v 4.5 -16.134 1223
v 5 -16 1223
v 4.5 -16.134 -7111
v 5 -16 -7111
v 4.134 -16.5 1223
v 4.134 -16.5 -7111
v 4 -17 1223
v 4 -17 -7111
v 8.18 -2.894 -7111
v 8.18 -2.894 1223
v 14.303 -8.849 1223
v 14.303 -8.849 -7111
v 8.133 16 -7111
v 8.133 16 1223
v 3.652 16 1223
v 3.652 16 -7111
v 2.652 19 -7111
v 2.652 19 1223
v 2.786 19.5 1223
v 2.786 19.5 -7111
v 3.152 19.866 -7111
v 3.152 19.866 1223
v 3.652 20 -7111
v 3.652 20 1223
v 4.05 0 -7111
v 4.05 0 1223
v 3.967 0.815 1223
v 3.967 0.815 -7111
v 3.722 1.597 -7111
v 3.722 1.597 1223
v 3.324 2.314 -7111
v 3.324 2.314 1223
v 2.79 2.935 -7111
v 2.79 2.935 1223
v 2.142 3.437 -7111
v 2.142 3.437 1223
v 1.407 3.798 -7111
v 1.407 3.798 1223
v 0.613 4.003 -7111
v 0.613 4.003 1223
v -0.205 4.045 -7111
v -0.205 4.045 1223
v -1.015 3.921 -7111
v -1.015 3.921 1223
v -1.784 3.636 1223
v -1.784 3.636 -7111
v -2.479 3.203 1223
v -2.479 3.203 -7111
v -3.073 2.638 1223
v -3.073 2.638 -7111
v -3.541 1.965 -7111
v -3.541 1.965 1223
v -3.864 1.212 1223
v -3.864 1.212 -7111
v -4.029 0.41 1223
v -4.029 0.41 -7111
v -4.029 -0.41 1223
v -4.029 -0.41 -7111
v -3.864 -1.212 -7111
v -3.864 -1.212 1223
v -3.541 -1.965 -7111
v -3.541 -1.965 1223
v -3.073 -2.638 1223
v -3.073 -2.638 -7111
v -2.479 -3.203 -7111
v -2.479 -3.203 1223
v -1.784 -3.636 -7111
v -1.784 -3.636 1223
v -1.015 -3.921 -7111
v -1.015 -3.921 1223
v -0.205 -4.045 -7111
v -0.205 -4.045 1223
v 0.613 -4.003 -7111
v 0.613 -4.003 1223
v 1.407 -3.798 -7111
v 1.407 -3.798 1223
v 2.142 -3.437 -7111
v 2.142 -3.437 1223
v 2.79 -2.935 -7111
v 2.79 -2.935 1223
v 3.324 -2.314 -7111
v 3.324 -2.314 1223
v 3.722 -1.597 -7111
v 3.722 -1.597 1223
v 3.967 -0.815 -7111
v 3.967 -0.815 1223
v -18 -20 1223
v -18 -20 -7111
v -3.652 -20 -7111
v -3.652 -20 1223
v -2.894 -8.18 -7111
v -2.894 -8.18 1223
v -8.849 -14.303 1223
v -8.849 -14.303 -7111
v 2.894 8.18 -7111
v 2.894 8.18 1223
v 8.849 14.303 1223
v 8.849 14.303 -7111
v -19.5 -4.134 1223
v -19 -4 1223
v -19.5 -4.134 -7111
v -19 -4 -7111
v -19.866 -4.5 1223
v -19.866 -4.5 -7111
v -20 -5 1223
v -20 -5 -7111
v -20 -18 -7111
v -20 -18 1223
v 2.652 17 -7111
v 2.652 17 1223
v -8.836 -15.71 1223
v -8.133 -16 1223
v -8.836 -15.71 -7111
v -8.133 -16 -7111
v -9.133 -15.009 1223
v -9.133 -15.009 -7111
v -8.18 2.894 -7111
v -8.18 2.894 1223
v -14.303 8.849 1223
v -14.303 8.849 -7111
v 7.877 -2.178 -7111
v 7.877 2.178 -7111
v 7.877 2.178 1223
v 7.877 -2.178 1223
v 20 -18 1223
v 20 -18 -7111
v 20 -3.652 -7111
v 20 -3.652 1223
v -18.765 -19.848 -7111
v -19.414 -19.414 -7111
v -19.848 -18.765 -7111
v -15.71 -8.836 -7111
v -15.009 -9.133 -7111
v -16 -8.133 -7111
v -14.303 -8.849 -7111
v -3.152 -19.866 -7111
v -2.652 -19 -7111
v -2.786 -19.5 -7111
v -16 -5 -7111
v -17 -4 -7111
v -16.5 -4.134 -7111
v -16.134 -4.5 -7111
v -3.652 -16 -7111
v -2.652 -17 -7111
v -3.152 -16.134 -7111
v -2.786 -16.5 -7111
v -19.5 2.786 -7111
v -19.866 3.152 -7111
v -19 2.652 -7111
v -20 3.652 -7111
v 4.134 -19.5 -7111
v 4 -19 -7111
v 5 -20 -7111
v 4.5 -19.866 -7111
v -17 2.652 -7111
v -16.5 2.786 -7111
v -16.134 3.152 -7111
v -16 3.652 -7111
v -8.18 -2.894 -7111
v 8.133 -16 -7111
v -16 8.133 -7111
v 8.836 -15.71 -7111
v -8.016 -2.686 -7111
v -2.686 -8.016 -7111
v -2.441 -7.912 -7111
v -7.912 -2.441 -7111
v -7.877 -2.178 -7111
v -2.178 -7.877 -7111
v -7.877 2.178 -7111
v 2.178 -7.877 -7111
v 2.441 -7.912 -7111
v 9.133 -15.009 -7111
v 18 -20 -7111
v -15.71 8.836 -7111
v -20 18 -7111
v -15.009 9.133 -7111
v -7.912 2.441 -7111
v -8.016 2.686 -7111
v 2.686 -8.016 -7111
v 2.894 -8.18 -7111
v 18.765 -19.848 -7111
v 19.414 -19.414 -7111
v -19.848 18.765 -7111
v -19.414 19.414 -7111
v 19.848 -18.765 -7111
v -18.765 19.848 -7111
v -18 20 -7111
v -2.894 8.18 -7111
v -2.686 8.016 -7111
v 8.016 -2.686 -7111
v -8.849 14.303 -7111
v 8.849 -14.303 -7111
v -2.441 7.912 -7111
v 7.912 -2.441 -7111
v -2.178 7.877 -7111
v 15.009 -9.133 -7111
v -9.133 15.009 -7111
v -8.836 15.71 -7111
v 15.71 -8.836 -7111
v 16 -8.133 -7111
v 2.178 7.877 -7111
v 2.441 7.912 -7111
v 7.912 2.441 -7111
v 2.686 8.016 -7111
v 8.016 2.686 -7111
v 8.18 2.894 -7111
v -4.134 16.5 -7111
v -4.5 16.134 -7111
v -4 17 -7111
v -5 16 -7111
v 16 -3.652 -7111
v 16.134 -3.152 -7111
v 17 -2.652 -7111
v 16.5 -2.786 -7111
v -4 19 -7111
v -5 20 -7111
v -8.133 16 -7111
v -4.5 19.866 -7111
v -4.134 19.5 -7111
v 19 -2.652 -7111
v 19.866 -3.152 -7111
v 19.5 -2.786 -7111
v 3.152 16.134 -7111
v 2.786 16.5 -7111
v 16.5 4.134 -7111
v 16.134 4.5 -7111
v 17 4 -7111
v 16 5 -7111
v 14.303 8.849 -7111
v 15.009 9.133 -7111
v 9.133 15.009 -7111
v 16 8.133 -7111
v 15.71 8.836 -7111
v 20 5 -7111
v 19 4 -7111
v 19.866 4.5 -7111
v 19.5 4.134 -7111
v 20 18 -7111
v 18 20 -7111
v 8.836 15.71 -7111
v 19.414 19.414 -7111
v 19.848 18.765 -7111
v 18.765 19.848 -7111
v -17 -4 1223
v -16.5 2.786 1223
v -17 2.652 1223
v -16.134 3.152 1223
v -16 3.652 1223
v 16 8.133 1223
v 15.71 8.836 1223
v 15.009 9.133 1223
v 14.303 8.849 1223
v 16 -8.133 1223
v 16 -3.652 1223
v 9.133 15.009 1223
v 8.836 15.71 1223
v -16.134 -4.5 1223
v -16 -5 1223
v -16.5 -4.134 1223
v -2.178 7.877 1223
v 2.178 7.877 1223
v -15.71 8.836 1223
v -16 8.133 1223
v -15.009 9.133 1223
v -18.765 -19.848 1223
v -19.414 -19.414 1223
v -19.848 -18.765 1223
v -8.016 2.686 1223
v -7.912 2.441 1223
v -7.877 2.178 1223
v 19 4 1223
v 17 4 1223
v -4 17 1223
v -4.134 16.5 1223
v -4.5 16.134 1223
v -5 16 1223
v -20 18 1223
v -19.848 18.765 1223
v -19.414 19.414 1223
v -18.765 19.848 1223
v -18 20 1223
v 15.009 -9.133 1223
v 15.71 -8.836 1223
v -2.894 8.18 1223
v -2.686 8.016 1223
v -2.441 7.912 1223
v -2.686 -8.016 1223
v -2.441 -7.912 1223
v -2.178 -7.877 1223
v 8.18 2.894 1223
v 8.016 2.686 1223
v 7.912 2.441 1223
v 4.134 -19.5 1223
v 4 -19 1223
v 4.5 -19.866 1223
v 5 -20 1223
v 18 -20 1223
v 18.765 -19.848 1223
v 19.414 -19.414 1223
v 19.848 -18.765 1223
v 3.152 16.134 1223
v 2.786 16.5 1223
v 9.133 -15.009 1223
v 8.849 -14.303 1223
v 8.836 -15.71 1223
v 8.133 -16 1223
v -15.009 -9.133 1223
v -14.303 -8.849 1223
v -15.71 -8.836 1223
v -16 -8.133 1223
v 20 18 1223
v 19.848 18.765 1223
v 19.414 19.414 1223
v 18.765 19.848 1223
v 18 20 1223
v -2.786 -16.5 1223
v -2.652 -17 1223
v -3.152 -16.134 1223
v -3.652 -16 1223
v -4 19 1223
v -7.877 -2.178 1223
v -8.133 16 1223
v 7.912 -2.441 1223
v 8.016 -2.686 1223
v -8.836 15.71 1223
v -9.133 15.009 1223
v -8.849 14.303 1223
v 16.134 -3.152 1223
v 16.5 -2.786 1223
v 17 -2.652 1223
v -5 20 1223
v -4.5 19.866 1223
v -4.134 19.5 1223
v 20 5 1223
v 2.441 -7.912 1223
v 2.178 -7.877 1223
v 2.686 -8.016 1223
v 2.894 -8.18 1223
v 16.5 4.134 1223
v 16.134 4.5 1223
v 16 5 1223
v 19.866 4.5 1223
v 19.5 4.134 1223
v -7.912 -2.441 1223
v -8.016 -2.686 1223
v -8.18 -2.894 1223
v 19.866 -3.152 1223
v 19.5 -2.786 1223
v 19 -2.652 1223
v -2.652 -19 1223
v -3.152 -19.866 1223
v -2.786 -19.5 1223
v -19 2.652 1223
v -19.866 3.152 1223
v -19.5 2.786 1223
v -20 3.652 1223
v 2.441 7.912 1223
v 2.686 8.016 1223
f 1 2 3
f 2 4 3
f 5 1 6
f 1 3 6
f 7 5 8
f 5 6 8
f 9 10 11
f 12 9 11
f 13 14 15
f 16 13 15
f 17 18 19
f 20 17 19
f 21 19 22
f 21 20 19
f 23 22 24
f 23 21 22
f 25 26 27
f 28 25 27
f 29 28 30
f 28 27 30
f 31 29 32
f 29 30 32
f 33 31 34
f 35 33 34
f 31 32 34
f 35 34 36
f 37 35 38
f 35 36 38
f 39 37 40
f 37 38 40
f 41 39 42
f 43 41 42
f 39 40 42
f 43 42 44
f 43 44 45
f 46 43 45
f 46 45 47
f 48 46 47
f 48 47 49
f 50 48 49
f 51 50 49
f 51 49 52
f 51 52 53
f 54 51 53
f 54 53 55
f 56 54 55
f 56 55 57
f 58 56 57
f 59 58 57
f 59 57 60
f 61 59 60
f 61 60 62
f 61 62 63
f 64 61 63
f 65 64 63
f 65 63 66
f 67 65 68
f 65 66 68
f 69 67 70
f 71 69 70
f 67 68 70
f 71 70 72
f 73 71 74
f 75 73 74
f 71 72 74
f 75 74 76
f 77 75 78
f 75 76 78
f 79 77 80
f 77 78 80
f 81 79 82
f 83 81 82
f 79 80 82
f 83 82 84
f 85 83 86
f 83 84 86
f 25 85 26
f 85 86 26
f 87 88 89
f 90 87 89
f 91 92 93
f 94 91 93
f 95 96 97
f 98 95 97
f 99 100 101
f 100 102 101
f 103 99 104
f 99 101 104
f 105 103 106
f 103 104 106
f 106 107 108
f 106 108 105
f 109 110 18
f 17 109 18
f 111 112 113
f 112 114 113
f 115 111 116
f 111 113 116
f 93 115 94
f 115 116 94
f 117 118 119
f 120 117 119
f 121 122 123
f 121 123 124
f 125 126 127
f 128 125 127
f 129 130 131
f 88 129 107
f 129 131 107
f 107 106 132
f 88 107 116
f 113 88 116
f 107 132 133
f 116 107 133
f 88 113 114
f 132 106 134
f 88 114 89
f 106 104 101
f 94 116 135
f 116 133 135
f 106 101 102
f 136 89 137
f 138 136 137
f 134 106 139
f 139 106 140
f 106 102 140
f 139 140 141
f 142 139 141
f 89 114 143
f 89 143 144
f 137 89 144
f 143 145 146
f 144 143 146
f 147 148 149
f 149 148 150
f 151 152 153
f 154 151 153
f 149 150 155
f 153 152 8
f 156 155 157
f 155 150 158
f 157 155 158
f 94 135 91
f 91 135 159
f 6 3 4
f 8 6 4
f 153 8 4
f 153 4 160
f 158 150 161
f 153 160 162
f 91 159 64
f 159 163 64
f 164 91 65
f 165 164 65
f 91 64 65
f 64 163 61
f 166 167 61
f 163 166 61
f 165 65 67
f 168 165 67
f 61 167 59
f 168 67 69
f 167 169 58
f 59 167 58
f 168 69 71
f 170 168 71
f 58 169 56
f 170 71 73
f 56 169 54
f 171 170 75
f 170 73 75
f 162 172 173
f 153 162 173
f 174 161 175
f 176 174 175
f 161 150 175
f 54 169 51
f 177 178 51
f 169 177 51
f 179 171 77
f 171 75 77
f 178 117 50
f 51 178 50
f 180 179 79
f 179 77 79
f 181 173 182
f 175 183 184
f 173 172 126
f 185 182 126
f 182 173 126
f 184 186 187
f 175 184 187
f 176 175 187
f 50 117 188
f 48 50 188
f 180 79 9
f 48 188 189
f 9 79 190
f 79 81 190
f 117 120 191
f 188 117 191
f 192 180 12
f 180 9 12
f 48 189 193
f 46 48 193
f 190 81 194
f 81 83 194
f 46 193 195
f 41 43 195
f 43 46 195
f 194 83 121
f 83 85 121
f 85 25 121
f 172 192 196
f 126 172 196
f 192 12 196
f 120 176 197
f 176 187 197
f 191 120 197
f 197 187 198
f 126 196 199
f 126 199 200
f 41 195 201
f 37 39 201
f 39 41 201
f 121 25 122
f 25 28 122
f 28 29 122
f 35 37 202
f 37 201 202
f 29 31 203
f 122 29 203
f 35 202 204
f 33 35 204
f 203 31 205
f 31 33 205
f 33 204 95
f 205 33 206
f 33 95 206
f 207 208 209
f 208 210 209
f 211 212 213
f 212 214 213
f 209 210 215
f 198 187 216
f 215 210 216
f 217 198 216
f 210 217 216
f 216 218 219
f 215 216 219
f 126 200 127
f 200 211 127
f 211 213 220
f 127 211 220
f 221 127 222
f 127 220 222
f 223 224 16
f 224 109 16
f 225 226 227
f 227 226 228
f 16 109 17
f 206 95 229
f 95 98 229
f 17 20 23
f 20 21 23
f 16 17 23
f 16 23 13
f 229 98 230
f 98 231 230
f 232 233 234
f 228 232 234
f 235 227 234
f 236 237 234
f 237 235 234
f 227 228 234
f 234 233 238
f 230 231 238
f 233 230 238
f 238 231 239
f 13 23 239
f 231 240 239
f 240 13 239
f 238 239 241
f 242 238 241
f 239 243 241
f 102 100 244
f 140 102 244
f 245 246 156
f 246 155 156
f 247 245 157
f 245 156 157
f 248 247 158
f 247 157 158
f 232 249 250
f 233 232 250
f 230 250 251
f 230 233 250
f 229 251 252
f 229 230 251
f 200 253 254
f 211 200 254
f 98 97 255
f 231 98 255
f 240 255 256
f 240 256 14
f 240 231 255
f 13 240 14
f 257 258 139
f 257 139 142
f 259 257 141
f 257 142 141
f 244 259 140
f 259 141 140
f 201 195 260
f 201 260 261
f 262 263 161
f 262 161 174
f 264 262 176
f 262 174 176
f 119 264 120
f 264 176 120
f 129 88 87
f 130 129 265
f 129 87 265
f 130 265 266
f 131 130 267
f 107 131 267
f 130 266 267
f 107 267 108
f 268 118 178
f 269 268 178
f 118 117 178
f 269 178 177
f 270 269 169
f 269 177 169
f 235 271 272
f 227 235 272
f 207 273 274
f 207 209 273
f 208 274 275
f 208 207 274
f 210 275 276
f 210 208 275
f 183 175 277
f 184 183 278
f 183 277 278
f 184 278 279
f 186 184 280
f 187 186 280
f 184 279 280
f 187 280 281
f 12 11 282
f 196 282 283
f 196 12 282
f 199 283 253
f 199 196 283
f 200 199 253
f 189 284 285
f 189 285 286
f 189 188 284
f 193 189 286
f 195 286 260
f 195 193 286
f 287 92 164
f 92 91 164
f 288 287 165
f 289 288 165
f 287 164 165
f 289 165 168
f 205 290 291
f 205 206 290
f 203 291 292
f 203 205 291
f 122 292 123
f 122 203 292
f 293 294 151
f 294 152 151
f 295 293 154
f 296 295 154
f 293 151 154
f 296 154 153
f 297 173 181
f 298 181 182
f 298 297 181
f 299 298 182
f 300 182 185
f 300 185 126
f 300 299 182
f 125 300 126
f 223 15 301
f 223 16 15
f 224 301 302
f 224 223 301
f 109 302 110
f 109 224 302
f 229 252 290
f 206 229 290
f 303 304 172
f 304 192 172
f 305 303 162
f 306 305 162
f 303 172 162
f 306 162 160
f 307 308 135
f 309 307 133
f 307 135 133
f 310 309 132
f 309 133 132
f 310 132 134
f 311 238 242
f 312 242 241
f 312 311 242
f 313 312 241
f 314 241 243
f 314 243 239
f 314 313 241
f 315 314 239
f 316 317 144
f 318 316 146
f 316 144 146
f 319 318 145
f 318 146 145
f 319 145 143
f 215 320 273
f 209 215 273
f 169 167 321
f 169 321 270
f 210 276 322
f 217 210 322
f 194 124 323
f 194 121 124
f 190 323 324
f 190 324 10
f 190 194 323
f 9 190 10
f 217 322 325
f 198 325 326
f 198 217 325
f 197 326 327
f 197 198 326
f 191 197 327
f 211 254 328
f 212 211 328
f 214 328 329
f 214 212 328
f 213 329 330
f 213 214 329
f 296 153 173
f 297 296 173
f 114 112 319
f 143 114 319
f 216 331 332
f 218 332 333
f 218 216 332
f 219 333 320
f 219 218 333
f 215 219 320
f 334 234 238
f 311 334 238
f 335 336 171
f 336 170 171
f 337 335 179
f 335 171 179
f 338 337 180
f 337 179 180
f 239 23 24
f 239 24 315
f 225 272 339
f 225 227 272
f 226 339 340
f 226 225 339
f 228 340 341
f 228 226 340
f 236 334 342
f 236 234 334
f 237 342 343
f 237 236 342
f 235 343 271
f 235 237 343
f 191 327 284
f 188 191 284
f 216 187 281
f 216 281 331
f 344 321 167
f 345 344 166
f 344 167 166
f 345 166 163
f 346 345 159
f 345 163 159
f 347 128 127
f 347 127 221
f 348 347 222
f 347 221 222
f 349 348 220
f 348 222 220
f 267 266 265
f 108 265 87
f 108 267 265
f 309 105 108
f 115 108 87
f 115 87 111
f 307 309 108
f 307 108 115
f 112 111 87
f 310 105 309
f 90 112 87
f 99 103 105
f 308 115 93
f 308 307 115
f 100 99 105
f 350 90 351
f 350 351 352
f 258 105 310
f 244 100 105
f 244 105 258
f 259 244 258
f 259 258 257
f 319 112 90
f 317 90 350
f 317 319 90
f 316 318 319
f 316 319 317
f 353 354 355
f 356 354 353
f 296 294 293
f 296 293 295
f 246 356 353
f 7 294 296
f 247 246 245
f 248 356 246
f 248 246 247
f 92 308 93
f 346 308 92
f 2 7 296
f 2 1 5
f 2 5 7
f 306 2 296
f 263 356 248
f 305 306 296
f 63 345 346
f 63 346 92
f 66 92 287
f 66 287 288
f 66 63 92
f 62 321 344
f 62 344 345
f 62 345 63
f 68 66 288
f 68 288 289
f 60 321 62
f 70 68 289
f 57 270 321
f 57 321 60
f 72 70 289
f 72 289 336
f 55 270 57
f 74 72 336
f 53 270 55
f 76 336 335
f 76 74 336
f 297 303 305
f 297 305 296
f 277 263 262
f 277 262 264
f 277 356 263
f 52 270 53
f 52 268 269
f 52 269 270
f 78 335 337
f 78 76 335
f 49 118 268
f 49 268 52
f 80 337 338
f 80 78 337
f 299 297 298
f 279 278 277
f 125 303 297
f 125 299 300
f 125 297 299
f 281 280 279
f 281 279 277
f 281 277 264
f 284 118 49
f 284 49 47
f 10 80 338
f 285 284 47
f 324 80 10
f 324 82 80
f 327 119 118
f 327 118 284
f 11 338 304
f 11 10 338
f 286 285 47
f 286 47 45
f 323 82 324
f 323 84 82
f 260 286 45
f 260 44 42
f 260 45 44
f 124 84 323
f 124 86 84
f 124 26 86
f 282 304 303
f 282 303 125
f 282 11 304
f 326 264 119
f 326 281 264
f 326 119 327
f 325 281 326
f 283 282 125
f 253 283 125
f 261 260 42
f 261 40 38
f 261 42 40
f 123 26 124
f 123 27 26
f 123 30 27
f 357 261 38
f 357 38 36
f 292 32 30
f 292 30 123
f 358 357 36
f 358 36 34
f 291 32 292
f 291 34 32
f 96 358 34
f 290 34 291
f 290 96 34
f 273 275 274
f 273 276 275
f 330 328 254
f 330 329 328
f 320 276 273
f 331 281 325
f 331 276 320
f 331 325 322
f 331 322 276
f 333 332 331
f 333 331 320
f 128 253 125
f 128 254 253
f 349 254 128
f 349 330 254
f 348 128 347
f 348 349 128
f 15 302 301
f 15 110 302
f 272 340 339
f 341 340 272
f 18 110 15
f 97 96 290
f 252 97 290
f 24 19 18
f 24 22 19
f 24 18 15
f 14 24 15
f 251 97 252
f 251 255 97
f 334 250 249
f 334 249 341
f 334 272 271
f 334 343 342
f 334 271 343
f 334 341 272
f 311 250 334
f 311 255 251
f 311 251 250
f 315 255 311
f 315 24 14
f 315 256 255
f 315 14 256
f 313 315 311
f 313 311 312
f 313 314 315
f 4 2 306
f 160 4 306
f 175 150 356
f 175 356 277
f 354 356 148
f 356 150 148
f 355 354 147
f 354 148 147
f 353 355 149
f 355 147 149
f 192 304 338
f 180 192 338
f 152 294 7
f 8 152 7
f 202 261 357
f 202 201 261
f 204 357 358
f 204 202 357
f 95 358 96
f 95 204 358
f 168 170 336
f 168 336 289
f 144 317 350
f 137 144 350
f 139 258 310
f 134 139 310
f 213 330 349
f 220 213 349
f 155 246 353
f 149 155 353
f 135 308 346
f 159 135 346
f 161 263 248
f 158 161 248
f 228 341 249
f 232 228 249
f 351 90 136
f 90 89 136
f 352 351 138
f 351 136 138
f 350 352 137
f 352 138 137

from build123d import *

# Parameters (mm, degrees)
EXTRUDE_1_DEPTH          = 1223
EXTRUDE_1_DEPTH_BACK     = 7111
SKETCH_1_W               = 40
SKETCH_1_H               = 40
SKETCH_2_R               = 4.05
CUT_EXTRUDE_1_DEPTH      = 10000
CUT_EXTRUDE_2_DEPTH      = 10000
FILLET_1_R               = 1
PATTERN_CIRCULAR_2_COUNT = 4
FILLET_2_R               = 1
FILLET_3_R               = 1
FILLET_4_R               = 1
FILLET_5_R               = 2


with BuildPart() as part:
    # 草图1 → 凸台-拉伸1 (new, two sides: drawn at the far end of the back side and taken through both)
    with BuildSketch(Plane.XY.offset(-EXTRUDE_1_DEPTH_BACK)):
        Rectangle(SKETCH_1_W, SKETCH_1_H)
    extrude(amount=EXTRUDE_1_DEPTH + EXTRUDE_1_DEPTH_BACK)

    # 草图2 → 切除-拉伸1 (cut)
    with BuildSketch(Plane.XY.offset(1223)):
        Circle(SKETCH_2_R)
    extrude(amount=-CUT_EXTRUDE_1_DEPTH, mode=Mode.SUBTRACT)

    # 草图4 → 切除-拉伸2 (cut)
    with BuildSketch(Plane.XY.offset(1223)):
        Polygon((20, 0), (20, 4), (16, 4), (16, 10.5), (7.876860985, 2.6), (7.876860985, -2.6), (16, -10.5), (16, -2.65197969), (20, -2.65197969), align=None)
    cut_extrude_2 = extrude(amount=-CUT_EXTRUDE_2_DEPTH, mode=Mode.SUBTRACT)

    # 圆角1
    fillet_1_edges = [part.edges().sort_by_distance(p)[0] for p in [
        (20, -2.65197969, -2944),
        (16, -2.65197969, -2944),
        (16, -10.5, -2944),
        (7.876860985, -2.6, -2944),
        (7.876860985, 2.6, -2944),
        (16, 10.5, -2944),
        (16, 4, -2944),
        (20, 4, -2944),
    ]]
    fillet(fillet_1_edges, radius=FILLET_1_R)

    # 阵列(圆周)2: 切除-拉伸2 ×4 about axis
    pattern_circular_2_axis = Axis((0, 0, 0), (0, 0, 1))
    for i in range(1, PATTERN_CIRCULAR_2_COUNT):
        add(cut_extrude_2.rotate(pattern_circular_2_axis, i * 360 / PATTERN_CIRCULAR_2_COUNT), mode=Mode.SUBTRACT)

    # 圆角2
    fillet_2_edges = [part.edges().sort_by_distance(p)[0] for p in [
        (2.65197969, 20, -2944),
        (2.65197969, 16, -2944),
        (10.5, 16, -2944),
        (2.6, 7.876860985, -2944),
        (-2.6, 7.876860985, -2944),
        (-10.5, 16, -2944),
        (-4, 16, -2944),
        (-4, 20, -2944),
    ]]
    fillet(fillet_2_edges, radius=FILLET_2_R)

    # 圆角3
    fillet_3_edges = [part.edges().sort_by_distance(p)[0] for p in [
        (-20, 2.65197969, -2944),
        (-16, 2.65197969, -2944),
        (-16, 10.5, -2944),
        (-7.876860985, 2.6, -2944),
        (-7.876860985, -2.6, -2944),
        (-16, -10.5, -2944),
        (-16, -4, -2944),
        (-20, -4, -2944),
    ]]
    fillet(fillet_3_edges, radius=FILLET_3_R)

    # 圆角4
    fillet_4_edges = [part.edges().sort_by_distance(p)[0] for p in [
        (-2.65197969, -20, -2944),
        (-2.65197969, -16, -2944),
        (-10.5, -16, -2944),
        (-2.6, -7.876860985, -2944),
        (2.6, -7.876860985, -2944),
        (10.5, -16, -2944),
        (4, -16, -2944),
        (4, -20, -2944),
    ]]
    fillet(fillet_4_edges, radius=FILLET_4_R)

    # 圆角5
    fillet_5_edges = [part.edges().sort_by_distance(p)[0] for p in [
        (20, -20, -2944),
        (-20, -20, -2944),
        (-20, 20, -2944),
        (20, 20, -2944),
    ]]
    fillet(fillet_5_edges, radius=FILLET_5_R)


solid = part.part
